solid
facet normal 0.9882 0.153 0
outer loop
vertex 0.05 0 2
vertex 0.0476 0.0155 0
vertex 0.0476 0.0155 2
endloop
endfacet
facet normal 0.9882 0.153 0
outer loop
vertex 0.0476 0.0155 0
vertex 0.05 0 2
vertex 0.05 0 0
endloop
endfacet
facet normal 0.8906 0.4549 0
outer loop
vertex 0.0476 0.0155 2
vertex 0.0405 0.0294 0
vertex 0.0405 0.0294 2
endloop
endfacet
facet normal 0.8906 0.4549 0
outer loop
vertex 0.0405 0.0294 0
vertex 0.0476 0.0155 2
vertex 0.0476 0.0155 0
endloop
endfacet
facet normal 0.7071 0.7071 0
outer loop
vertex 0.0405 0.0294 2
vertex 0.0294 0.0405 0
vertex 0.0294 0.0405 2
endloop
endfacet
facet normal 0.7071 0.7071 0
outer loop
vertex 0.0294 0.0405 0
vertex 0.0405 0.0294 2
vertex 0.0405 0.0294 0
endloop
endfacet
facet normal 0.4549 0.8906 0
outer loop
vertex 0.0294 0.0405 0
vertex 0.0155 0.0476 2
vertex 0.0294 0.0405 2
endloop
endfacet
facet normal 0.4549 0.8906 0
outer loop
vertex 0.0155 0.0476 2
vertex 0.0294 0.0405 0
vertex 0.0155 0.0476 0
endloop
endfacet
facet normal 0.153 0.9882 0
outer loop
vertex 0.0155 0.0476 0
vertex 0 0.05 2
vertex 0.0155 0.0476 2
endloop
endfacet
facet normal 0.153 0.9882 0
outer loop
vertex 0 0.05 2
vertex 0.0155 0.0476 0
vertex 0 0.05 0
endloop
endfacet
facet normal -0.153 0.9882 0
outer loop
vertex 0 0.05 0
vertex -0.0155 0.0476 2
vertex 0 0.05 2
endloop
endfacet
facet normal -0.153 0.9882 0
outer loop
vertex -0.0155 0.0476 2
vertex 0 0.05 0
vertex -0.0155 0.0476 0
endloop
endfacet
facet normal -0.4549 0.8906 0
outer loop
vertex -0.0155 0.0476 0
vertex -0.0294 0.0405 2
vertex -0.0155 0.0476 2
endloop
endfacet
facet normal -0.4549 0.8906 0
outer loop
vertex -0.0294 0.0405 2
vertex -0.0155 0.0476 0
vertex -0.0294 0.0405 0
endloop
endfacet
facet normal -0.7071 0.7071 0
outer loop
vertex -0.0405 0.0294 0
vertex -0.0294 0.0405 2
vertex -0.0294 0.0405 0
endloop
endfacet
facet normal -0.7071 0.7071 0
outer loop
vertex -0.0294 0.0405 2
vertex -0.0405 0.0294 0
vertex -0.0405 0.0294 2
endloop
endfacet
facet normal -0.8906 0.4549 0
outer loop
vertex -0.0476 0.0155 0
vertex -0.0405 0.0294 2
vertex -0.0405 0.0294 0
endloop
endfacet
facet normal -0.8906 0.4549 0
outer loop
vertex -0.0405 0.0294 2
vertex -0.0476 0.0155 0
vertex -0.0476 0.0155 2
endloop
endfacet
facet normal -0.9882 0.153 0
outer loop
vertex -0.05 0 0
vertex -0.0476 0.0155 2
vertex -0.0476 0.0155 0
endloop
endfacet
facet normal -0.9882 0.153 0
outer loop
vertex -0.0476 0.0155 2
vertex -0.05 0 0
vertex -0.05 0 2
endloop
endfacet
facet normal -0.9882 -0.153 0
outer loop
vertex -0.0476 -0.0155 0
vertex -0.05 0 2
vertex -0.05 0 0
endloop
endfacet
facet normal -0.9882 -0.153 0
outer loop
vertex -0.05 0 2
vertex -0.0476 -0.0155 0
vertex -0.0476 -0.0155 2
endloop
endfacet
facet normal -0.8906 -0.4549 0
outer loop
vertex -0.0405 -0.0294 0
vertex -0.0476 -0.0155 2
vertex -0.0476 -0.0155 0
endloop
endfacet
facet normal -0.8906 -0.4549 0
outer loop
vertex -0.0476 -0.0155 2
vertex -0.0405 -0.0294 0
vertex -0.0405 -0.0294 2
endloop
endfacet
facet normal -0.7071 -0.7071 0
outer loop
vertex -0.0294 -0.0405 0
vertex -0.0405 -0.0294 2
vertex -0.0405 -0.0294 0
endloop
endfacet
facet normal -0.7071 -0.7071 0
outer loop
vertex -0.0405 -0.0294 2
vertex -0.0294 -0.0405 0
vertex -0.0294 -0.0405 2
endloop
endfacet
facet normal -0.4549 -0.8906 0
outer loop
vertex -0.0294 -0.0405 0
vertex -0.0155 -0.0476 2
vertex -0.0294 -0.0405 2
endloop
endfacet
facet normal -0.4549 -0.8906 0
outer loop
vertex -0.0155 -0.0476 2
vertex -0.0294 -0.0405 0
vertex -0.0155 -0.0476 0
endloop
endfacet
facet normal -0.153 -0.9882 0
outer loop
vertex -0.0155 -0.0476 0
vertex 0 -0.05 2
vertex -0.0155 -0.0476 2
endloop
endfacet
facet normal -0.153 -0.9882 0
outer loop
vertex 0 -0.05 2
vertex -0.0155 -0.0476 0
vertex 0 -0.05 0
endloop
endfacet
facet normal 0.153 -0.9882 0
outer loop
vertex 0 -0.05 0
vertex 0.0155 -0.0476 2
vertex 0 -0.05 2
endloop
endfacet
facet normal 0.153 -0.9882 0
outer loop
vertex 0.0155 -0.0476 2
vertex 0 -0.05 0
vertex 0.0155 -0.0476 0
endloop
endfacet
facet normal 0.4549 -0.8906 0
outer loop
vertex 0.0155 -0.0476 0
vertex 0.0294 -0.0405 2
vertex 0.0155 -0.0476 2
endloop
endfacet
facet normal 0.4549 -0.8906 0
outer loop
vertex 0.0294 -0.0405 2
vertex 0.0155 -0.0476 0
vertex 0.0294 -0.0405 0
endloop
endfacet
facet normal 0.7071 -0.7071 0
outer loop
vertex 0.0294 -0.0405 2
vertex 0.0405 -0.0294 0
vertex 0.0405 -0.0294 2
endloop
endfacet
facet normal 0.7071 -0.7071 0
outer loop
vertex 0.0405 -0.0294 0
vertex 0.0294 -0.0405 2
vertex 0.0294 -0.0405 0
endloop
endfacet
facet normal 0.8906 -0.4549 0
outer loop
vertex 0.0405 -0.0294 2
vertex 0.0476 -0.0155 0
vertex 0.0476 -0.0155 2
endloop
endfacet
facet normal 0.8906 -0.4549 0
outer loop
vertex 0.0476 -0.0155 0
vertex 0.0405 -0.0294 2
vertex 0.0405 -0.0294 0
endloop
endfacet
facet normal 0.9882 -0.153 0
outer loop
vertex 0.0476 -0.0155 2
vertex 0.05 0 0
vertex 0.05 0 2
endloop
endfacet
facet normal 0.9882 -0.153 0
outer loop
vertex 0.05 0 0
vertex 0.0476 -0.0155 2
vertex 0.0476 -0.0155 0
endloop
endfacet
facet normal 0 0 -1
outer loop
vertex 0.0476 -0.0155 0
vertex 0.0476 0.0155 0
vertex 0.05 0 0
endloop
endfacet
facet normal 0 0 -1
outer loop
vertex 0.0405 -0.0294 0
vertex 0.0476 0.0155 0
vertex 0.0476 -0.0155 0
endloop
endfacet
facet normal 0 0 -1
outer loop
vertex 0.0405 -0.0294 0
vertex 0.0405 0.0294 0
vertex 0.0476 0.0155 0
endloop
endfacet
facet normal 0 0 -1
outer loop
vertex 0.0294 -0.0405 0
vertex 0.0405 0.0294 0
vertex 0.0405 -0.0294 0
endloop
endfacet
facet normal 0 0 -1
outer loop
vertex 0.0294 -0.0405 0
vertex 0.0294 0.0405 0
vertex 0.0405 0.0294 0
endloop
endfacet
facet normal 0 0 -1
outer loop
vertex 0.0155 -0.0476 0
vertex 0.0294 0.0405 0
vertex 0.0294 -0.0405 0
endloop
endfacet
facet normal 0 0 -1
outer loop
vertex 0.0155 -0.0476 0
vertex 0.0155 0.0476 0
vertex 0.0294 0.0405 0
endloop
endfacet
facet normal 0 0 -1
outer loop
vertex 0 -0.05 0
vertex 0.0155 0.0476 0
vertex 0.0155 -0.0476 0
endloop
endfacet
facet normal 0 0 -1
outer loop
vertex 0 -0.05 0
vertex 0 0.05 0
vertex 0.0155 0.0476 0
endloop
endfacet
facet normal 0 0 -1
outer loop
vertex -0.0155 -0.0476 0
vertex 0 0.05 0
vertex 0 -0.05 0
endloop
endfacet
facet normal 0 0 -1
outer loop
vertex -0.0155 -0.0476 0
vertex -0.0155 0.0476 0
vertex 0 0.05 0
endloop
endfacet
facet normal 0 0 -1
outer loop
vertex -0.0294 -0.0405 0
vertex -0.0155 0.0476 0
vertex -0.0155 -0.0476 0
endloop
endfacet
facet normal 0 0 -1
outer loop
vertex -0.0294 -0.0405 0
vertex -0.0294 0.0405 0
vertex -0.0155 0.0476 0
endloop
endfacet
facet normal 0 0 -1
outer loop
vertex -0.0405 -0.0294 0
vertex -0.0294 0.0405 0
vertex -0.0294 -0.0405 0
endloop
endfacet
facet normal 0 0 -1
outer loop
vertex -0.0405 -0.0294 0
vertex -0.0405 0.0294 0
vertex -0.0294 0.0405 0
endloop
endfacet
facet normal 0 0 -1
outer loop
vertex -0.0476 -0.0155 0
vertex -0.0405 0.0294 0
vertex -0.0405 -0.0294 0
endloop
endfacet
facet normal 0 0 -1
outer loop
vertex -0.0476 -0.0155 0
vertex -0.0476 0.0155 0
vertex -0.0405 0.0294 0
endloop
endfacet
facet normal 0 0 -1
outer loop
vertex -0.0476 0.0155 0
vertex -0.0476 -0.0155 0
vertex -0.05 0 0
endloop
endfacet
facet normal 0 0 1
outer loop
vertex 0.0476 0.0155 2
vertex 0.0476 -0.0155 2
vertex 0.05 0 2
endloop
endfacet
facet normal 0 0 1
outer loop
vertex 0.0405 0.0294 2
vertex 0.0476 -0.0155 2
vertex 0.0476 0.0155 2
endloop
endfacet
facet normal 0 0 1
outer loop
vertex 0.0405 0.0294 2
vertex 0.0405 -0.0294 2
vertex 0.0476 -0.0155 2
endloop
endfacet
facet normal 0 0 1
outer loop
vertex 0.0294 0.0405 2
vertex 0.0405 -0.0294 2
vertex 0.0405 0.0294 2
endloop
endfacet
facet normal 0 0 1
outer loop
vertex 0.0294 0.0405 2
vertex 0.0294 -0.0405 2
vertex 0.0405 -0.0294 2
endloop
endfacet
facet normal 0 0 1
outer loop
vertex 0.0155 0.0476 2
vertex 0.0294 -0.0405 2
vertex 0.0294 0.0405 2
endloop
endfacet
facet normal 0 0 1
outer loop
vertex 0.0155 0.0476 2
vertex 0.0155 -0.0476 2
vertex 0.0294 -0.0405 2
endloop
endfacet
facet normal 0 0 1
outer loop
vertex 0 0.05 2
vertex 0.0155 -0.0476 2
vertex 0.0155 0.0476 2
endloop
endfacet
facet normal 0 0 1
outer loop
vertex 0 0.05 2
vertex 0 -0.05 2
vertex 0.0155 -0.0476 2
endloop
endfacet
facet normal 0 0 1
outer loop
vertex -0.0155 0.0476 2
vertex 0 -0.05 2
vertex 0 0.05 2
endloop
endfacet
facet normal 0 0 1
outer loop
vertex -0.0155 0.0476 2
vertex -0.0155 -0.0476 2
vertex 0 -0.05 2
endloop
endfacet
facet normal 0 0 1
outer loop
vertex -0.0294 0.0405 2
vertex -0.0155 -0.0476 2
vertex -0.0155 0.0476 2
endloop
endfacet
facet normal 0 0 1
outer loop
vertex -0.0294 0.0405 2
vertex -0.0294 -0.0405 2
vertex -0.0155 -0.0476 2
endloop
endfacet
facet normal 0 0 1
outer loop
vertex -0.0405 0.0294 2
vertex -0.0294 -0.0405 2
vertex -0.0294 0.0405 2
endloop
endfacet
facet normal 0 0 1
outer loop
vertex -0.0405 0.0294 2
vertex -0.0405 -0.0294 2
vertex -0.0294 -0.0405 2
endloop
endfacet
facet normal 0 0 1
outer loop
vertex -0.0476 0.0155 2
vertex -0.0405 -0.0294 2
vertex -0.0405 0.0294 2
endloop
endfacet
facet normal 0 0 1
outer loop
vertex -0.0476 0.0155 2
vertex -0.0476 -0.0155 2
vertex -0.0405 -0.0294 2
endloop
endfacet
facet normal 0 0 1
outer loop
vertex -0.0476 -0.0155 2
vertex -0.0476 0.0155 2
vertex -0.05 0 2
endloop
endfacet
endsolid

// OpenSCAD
r_out=0.05;
height=2;
n_facets=20;


cylinder(r=r_out, h=height, $fn=n_facets);
